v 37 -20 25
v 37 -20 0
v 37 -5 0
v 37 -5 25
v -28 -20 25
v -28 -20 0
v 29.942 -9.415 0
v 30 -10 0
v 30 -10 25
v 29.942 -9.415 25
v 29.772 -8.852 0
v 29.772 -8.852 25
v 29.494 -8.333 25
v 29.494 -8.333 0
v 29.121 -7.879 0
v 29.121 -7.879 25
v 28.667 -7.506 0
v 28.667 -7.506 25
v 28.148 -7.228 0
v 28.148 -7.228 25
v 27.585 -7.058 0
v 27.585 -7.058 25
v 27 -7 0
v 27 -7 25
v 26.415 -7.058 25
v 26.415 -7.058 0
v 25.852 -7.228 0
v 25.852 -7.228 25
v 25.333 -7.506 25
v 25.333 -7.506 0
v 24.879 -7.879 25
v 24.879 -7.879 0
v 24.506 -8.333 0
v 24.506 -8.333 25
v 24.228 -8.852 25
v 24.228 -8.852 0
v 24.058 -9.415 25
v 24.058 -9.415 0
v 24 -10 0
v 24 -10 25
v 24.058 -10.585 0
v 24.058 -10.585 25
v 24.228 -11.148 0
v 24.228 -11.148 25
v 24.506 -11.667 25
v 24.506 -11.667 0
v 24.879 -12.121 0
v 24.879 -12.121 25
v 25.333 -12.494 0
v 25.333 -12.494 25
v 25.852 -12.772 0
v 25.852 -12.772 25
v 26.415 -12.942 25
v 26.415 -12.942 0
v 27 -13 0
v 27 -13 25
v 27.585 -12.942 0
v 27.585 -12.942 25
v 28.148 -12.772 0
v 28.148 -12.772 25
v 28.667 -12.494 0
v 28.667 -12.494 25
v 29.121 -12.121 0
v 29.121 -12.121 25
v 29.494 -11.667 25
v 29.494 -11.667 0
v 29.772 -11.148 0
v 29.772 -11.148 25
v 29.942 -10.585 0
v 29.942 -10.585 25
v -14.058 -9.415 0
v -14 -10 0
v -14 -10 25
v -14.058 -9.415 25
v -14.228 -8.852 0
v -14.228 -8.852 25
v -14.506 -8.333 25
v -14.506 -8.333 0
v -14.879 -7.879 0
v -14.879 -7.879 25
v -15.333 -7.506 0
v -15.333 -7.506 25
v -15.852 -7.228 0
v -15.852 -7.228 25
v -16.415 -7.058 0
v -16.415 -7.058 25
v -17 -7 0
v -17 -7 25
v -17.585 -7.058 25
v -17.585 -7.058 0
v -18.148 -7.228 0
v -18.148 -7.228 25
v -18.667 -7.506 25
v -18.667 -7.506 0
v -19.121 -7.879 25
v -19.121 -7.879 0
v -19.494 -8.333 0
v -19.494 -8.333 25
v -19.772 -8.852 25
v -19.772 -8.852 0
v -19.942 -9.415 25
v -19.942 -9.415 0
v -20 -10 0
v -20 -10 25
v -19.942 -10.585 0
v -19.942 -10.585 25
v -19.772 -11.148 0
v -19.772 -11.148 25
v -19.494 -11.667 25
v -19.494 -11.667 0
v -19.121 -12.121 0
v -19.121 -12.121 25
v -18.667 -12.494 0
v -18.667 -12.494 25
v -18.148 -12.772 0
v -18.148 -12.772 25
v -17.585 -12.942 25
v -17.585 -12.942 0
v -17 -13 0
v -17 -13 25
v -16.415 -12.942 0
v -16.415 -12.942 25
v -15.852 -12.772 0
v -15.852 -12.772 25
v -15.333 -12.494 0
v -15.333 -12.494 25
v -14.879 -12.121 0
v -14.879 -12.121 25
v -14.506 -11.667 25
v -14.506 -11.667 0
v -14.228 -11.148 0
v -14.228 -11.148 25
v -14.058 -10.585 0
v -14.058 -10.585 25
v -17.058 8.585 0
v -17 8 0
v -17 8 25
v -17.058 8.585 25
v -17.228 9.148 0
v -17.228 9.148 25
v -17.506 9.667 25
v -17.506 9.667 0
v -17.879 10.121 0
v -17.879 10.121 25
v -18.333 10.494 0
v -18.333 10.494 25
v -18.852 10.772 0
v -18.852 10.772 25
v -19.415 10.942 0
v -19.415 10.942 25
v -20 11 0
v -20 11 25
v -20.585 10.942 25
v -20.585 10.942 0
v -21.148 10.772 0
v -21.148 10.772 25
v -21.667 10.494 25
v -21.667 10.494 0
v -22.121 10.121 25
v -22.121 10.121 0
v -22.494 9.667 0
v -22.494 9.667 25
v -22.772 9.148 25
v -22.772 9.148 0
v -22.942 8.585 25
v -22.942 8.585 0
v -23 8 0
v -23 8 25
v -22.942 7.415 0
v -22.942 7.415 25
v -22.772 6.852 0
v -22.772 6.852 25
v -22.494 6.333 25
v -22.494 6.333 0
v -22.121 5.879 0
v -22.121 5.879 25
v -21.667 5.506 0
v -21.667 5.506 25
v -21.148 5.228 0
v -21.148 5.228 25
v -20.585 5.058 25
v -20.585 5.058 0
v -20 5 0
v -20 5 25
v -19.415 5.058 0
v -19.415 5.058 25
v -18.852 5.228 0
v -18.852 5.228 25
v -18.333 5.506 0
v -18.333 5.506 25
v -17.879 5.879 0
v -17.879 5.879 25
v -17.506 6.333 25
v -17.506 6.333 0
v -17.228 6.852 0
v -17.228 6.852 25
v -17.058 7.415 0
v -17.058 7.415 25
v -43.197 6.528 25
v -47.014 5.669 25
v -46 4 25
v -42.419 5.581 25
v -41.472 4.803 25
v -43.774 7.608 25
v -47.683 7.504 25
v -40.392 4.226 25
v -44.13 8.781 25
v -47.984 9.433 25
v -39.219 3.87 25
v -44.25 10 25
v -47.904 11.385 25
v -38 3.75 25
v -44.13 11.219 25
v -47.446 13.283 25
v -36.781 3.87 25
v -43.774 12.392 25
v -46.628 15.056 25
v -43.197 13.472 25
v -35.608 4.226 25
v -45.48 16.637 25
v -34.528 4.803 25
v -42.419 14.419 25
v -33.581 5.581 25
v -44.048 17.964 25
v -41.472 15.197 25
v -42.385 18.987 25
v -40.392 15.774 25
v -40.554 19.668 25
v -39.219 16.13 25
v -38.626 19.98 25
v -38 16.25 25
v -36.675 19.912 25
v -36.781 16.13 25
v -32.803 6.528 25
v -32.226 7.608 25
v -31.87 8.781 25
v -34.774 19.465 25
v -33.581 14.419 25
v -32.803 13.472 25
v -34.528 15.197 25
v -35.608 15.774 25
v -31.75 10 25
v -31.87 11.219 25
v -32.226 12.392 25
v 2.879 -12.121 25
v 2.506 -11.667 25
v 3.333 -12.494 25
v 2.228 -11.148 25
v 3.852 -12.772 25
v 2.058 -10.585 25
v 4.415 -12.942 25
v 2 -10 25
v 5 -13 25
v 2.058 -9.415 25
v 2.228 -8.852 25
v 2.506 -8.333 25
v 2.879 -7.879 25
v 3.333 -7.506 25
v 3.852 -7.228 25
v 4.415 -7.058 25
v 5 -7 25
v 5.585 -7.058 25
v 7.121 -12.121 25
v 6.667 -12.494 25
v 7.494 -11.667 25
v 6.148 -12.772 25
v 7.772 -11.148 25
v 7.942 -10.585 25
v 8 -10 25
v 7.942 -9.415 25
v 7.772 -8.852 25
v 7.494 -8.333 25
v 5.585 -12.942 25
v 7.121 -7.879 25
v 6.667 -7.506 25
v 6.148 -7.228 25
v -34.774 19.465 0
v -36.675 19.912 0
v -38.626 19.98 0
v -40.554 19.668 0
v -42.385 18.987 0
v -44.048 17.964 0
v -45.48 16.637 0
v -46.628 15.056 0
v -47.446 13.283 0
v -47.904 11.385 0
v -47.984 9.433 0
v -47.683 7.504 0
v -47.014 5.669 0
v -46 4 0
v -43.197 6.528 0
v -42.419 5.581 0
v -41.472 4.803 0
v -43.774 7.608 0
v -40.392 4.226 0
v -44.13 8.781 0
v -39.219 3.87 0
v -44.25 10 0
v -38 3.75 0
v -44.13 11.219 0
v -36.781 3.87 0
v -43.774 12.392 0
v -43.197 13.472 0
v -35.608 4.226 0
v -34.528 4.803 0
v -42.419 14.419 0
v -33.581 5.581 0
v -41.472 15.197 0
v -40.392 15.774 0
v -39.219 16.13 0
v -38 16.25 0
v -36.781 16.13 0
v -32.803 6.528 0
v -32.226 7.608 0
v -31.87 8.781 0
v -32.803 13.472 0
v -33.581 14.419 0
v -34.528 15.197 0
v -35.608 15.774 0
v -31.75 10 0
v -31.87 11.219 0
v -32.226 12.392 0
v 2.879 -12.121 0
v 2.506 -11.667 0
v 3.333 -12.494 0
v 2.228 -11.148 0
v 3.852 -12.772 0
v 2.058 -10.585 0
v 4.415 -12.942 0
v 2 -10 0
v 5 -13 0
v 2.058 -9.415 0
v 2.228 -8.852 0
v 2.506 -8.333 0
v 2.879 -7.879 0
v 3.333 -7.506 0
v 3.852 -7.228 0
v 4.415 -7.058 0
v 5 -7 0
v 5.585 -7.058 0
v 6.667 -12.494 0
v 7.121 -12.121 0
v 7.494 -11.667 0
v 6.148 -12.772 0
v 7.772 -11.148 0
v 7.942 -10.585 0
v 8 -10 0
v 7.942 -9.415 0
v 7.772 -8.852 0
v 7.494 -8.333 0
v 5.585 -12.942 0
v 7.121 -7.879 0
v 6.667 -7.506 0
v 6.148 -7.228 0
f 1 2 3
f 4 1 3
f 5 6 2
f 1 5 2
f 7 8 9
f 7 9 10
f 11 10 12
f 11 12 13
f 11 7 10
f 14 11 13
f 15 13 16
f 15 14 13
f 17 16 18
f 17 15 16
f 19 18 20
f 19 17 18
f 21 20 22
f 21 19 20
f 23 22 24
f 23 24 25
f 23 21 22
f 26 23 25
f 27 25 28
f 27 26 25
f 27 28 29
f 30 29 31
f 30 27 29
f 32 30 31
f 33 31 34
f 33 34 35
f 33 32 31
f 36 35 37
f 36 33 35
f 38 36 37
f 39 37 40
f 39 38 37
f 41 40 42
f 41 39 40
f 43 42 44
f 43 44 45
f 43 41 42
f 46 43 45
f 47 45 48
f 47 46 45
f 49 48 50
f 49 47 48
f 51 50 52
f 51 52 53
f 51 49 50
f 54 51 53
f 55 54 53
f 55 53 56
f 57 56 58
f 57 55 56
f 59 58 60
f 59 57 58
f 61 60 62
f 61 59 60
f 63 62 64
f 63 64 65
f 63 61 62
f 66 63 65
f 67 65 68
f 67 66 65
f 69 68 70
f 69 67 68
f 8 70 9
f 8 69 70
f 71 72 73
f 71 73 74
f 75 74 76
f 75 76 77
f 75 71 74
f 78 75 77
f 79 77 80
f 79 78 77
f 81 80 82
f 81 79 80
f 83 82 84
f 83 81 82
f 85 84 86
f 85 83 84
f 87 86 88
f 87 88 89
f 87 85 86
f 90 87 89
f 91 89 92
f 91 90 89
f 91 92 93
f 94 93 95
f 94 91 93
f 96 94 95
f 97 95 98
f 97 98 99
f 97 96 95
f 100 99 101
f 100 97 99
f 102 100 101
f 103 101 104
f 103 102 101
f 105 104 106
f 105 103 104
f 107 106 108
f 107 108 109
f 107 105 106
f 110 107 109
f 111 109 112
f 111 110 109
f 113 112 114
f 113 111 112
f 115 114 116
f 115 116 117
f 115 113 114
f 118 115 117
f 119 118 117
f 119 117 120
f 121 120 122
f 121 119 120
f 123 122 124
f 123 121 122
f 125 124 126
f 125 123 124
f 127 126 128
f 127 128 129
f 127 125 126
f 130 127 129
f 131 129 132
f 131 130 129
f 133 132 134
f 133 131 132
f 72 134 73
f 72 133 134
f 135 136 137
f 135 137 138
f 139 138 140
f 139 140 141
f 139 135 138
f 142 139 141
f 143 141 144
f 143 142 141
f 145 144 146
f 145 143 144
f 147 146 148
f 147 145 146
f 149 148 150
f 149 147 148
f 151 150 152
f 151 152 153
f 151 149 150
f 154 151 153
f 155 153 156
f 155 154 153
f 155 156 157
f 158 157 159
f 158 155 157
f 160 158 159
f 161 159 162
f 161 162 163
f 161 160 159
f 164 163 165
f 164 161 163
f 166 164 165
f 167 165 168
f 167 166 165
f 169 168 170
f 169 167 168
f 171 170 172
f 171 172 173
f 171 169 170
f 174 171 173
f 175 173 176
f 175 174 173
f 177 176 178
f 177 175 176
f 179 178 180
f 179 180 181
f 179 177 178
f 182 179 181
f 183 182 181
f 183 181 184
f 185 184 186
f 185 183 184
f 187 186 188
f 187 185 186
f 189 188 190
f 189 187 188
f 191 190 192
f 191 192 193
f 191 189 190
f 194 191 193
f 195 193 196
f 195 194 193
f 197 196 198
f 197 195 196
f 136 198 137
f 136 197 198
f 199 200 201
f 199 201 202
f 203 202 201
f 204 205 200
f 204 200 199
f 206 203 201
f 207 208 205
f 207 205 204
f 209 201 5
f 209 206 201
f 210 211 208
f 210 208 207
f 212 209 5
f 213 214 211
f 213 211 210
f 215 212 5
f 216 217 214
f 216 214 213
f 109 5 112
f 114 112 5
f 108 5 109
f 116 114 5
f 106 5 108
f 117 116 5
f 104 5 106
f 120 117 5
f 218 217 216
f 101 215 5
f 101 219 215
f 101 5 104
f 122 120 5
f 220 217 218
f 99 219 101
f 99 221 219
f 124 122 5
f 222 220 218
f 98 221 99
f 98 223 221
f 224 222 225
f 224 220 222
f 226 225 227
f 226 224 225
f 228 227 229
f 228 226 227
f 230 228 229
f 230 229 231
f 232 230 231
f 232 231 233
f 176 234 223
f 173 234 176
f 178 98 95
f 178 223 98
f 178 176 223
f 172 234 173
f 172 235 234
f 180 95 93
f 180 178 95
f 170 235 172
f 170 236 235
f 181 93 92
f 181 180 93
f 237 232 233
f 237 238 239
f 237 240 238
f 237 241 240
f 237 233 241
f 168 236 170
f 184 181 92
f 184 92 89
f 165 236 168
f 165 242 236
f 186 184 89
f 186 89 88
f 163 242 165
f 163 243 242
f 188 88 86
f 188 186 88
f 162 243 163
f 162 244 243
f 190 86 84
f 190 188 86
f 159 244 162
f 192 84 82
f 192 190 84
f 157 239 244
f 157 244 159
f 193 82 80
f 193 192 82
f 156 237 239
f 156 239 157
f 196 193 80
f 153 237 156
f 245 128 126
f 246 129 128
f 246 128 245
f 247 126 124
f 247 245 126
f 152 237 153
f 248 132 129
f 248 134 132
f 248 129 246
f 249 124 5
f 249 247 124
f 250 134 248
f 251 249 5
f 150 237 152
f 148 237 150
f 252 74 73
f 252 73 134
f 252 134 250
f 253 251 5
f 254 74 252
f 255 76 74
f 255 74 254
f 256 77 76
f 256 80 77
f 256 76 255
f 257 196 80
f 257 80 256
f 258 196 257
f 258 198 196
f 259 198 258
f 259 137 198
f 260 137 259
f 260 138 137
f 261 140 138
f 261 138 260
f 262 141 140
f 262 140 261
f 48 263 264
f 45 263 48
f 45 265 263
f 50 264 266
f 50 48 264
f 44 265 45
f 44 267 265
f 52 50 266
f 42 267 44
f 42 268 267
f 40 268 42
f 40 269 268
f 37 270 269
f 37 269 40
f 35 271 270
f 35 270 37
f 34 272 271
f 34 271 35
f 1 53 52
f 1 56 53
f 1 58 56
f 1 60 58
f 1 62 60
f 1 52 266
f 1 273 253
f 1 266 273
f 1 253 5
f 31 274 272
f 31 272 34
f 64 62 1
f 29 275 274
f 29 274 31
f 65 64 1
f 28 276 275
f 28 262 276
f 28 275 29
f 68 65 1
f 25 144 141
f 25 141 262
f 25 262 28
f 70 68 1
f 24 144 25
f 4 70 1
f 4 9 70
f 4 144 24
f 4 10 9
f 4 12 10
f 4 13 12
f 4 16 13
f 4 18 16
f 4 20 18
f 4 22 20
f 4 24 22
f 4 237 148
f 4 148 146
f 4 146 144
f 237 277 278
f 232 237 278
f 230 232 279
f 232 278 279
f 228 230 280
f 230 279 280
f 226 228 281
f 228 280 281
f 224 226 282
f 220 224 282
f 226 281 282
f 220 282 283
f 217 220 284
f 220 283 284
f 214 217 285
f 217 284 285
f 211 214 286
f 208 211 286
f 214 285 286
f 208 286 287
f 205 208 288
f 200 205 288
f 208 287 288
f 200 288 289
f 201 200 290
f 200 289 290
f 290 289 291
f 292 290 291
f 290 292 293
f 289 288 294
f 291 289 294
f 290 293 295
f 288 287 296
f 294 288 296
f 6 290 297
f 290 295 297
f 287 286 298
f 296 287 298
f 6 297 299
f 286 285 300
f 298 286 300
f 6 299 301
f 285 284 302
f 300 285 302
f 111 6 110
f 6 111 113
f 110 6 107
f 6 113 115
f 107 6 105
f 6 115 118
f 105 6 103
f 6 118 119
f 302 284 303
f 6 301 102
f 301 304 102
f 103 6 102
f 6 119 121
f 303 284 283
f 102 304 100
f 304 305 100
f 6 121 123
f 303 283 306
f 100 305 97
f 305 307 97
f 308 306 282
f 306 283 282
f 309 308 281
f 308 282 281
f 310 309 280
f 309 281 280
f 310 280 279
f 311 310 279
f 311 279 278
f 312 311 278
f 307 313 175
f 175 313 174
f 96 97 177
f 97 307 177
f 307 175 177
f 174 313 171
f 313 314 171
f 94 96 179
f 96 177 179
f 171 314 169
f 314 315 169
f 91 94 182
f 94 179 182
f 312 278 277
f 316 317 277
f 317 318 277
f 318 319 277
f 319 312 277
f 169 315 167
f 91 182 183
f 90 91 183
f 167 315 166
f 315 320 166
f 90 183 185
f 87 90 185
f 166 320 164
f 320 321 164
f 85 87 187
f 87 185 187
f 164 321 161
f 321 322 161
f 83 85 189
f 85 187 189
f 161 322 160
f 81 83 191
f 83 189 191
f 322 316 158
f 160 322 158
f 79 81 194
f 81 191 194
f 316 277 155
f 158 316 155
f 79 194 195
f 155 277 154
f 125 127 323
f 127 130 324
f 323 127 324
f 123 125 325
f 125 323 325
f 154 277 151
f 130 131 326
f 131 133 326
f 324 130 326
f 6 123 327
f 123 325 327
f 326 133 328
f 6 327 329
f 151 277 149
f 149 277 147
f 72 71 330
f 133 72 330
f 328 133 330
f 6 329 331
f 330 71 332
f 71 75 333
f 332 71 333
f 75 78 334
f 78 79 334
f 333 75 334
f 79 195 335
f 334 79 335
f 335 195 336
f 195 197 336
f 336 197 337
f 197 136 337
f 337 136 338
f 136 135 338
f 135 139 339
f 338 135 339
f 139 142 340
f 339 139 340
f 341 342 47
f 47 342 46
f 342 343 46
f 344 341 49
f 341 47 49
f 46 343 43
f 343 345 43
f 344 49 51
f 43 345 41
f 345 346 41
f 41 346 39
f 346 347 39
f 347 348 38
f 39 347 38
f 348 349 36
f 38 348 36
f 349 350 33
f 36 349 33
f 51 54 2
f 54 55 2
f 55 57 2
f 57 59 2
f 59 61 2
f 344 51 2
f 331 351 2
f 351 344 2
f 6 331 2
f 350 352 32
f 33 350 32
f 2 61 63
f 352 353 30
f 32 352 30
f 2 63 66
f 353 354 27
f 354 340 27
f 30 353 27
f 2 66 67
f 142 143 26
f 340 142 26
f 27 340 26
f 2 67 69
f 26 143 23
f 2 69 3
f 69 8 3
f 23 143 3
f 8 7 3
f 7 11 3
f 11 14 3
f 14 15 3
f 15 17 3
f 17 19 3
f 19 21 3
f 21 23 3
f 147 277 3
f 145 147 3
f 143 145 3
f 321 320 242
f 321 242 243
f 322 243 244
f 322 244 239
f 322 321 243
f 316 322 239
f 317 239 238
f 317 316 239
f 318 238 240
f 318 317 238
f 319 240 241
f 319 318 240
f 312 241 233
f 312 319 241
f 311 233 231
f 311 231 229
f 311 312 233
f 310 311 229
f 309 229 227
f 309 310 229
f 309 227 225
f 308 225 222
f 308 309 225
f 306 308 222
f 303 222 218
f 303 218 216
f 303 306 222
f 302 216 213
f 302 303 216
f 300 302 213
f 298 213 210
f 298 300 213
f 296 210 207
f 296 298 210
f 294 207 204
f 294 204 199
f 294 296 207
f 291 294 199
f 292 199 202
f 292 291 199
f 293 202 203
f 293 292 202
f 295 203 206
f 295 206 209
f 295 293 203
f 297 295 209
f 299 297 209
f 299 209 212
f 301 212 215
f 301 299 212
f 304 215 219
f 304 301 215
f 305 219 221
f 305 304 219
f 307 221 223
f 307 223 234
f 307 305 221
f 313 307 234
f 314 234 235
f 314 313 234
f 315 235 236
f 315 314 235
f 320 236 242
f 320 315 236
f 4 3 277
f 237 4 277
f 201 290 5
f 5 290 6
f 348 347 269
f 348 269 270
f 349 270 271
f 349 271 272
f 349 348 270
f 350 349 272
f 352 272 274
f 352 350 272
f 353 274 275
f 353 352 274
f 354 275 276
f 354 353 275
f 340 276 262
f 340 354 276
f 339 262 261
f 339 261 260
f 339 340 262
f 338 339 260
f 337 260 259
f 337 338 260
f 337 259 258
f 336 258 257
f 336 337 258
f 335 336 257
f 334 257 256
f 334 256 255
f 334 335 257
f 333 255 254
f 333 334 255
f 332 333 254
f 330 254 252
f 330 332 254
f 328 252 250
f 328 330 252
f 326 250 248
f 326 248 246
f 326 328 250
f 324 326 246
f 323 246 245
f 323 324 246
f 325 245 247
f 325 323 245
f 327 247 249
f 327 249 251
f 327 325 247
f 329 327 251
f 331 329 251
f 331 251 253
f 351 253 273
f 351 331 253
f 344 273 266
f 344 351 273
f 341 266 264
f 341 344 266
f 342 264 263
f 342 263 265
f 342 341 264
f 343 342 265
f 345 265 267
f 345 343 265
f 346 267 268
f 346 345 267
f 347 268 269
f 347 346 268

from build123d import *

# Parameters (mm, degrees)
F0_R     = 3
F0_R_2   = 6.25
F1_DEPTH = 25


with BuildPart() as f1:
    # F0 (on Top) → F1 (new body)
    with BuildSketch(Plane.XY):
        with BuildLine():
            Line((37, -5), (-34.773622, 19.465225))
            ThreePointArc((-34.773622, 19.465225), (-46.092599, 15.874508), (-46, 4))
            Line((-46, 4), (-28, -20))
            Line((-28, -20), (37, -20))
            Line((37, -20), (37, -5))
        make_face()
        with Locations((-17, -10)):
            Circle(F0_R, mode=Mode.SUBTRACT)
        with Locations((5, -10)):
            Circle(F0_R, mode=Mode.SUBTRACT)
        with Locations((27, -10)):
            Circle(F0_R, mode=Mode.SUBTRACT)
        with Locations((-20, 8)):
            Circle(F0_R, mode=Mode.SUBTRACT)
        with Locations((-38, 10)):
            Circle(F0_R_2, mode=Mode.SUBTRACT)
    extrude(amount=F1_DEPTH)


solid = f1.part
